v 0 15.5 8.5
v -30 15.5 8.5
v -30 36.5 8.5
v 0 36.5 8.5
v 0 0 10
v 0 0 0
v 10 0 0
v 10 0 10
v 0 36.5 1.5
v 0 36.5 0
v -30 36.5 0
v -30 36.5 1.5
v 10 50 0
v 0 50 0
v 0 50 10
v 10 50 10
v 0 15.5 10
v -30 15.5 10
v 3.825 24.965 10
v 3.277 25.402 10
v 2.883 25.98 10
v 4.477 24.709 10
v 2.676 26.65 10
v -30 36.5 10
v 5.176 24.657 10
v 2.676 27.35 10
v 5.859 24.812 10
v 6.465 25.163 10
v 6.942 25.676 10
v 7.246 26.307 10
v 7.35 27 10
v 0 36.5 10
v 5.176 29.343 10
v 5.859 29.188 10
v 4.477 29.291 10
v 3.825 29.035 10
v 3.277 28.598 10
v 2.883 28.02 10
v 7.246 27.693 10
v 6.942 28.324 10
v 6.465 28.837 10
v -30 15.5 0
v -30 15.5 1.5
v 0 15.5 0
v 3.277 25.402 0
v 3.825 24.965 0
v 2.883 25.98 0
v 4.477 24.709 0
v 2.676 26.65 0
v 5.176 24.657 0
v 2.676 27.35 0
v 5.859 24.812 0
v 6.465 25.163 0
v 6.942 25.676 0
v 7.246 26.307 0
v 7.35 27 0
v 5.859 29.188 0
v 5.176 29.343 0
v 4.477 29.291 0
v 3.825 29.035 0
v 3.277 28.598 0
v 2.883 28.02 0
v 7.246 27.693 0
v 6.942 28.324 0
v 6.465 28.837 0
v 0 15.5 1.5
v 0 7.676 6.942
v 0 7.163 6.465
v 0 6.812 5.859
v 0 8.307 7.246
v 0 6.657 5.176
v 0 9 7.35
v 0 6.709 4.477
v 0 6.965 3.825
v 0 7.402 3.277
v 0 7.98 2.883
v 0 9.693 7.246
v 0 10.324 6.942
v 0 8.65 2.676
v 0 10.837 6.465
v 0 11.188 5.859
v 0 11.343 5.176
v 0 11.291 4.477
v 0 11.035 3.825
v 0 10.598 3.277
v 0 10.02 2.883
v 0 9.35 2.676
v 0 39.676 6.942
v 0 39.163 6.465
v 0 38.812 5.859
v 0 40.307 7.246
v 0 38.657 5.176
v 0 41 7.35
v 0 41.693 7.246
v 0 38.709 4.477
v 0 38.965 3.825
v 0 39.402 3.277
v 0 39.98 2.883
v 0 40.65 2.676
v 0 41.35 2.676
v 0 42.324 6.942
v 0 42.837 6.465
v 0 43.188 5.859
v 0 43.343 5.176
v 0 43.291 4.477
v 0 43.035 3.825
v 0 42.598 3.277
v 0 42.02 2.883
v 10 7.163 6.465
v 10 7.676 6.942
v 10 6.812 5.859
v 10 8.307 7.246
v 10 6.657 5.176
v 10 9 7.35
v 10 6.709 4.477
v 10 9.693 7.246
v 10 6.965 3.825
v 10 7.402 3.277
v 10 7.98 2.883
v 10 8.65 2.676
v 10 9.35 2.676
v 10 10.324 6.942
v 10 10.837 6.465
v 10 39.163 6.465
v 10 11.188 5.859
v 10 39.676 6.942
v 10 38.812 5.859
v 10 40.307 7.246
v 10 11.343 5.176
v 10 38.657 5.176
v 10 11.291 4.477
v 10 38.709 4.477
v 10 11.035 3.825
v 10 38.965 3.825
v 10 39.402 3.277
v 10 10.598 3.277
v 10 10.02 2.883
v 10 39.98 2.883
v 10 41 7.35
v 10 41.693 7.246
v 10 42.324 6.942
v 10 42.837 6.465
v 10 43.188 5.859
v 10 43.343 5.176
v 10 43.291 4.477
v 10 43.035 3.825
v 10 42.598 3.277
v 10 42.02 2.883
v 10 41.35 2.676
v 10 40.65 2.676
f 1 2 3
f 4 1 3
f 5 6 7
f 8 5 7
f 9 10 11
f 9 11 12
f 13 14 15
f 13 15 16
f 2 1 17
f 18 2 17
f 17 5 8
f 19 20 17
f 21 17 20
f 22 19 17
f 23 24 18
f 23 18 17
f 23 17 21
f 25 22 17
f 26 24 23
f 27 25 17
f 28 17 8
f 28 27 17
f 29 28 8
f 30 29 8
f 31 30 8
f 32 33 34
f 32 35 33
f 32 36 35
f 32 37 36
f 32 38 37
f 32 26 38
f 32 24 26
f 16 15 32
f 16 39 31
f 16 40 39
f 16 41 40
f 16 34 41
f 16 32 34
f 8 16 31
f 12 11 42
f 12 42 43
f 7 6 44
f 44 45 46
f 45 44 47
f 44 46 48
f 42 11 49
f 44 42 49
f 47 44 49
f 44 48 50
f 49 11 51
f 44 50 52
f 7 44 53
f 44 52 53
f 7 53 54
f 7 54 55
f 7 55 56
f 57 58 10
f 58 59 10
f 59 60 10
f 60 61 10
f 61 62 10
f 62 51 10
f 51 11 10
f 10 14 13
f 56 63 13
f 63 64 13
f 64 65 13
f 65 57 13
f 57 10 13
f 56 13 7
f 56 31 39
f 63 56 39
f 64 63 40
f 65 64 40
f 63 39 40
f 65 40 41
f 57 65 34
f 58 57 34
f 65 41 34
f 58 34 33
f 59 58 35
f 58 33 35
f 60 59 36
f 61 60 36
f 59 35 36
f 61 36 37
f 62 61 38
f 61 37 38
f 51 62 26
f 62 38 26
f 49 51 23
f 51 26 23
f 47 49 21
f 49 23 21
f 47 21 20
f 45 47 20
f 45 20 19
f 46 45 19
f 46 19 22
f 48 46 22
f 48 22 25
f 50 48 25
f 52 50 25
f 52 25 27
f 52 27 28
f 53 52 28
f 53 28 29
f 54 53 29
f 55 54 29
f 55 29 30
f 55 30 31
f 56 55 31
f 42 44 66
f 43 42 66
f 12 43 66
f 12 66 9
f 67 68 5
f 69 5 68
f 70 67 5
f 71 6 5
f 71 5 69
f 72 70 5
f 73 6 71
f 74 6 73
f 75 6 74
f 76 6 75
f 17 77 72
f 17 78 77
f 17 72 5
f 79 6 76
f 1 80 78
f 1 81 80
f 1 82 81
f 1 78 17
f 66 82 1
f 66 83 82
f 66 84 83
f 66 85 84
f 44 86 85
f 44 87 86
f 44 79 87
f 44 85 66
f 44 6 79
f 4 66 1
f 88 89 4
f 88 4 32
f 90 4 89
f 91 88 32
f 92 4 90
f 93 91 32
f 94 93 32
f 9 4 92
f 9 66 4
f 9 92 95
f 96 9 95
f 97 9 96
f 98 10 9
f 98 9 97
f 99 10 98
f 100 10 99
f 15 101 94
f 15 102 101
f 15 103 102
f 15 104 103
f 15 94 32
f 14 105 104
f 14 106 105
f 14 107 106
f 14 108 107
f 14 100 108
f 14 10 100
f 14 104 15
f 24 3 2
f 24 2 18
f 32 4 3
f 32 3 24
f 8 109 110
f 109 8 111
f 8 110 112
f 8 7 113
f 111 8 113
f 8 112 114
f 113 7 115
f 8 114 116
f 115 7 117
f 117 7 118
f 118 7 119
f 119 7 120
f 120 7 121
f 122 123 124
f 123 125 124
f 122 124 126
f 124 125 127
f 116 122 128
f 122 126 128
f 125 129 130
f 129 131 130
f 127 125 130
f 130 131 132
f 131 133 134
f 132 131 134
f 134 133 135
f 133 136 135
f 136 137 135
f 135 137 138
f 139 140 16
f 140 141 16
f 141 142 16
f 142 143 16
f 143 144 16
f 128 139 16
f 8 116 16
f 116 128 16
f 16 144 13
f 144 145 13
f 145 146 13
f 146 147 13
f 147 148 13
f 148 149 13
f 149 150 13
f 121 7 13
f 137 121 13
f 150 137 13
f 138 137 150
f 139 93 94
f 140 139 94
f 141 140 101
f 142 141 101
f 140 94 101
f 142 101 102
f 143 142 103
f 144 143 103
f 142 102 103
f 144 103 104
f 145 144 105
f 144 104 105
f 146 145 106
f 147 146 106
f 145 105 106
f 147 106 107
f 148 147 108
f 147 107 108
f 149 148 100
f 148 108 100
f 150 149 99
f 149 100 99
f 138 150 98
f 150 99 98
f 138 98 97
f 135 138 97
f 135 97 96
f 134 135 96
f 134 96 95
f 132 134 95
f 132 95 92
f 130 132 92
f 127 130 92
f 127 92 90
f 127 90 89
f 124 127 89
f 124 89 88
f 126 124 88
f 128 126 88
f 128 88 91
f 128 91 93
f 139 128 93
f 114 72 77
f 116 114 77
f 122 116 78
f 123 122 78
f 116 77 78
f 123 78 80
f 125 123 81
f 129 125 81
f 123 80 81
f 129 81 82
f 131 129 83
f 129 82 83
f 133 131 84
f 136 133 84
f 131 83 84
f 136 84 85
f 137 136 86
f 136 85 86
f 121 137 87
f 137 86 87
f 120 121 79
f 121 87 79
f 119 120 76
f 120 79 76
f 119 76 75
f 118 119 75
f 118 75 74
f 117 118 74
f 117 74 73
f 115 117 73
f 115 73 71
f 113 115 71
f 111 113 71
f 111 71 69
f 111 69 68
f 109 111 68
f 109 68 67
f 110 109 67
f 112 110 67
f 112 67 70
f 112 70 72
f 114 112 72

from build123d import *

# Parameters (mm, degrees)
SKETCH2_W           = 10
SKETCH2_H           = 50
BOSS_EXTRUDE1_DEPTH = 10
SKETCH6_R           = 2.35
CUT_EXTRUDE3_DEPTH  = 11
SKETCH7_R           = 2.35
CUT_EXTRUDE4_DEPTH  = 11
SKETCH8_W           = 1.5
SKETCH8_H           = 21
BOSS_EXTRUDE2_DEPTH = 30


with BuildPart() as part:
    # Sketch2 → Boss-Extrude1 (new body)
    with BuildSketch(Plane.XY):
        with Locations((5, 25)):
            Rectangle(SKETCH2_W, SKETCH2_H)
    extrude(amount=BOSS_EXTRUDE1_DEPTH)

    # Sketch6 → Cut-Extrude3 (cut, through all)
    with BuildSketch(Plane.XY.offset(10)):
        with Locations((5, 27)):
            Circle(SKETCH6_R)
    extrude(amount=-CUT_EXTRUDE3_DEPTH, mode=Mode.SUBTRACT)

    # Sketch7 → Cut-Extrude4 (cut, through all)
    with BuildSketch(Plane.ZY):
        with Locations((5, 41)):
            Circle(SKETCH7_R)
        with Locations((5, 9)):
            Circle(SKETCH7_R)
    extrude(amount=-CUT_EXTRUDE4_DEPTH, mode=Mode.SUBTRACT)

    # Sketch8 → Boss-Extrude2 (add)
    with BuildSketch(Plane.ZY):
        with Locations((9.25, 26)):
            Rectangle(SKETCH8_W, SKETCH8_H)
        with Locations((0.75, 26)):
            Rectangle(SKETCH8_W, SKETCH8_H)
    extrude(amount=BOSS_EXTRUDE2_DEPTH)


solid = part.part
